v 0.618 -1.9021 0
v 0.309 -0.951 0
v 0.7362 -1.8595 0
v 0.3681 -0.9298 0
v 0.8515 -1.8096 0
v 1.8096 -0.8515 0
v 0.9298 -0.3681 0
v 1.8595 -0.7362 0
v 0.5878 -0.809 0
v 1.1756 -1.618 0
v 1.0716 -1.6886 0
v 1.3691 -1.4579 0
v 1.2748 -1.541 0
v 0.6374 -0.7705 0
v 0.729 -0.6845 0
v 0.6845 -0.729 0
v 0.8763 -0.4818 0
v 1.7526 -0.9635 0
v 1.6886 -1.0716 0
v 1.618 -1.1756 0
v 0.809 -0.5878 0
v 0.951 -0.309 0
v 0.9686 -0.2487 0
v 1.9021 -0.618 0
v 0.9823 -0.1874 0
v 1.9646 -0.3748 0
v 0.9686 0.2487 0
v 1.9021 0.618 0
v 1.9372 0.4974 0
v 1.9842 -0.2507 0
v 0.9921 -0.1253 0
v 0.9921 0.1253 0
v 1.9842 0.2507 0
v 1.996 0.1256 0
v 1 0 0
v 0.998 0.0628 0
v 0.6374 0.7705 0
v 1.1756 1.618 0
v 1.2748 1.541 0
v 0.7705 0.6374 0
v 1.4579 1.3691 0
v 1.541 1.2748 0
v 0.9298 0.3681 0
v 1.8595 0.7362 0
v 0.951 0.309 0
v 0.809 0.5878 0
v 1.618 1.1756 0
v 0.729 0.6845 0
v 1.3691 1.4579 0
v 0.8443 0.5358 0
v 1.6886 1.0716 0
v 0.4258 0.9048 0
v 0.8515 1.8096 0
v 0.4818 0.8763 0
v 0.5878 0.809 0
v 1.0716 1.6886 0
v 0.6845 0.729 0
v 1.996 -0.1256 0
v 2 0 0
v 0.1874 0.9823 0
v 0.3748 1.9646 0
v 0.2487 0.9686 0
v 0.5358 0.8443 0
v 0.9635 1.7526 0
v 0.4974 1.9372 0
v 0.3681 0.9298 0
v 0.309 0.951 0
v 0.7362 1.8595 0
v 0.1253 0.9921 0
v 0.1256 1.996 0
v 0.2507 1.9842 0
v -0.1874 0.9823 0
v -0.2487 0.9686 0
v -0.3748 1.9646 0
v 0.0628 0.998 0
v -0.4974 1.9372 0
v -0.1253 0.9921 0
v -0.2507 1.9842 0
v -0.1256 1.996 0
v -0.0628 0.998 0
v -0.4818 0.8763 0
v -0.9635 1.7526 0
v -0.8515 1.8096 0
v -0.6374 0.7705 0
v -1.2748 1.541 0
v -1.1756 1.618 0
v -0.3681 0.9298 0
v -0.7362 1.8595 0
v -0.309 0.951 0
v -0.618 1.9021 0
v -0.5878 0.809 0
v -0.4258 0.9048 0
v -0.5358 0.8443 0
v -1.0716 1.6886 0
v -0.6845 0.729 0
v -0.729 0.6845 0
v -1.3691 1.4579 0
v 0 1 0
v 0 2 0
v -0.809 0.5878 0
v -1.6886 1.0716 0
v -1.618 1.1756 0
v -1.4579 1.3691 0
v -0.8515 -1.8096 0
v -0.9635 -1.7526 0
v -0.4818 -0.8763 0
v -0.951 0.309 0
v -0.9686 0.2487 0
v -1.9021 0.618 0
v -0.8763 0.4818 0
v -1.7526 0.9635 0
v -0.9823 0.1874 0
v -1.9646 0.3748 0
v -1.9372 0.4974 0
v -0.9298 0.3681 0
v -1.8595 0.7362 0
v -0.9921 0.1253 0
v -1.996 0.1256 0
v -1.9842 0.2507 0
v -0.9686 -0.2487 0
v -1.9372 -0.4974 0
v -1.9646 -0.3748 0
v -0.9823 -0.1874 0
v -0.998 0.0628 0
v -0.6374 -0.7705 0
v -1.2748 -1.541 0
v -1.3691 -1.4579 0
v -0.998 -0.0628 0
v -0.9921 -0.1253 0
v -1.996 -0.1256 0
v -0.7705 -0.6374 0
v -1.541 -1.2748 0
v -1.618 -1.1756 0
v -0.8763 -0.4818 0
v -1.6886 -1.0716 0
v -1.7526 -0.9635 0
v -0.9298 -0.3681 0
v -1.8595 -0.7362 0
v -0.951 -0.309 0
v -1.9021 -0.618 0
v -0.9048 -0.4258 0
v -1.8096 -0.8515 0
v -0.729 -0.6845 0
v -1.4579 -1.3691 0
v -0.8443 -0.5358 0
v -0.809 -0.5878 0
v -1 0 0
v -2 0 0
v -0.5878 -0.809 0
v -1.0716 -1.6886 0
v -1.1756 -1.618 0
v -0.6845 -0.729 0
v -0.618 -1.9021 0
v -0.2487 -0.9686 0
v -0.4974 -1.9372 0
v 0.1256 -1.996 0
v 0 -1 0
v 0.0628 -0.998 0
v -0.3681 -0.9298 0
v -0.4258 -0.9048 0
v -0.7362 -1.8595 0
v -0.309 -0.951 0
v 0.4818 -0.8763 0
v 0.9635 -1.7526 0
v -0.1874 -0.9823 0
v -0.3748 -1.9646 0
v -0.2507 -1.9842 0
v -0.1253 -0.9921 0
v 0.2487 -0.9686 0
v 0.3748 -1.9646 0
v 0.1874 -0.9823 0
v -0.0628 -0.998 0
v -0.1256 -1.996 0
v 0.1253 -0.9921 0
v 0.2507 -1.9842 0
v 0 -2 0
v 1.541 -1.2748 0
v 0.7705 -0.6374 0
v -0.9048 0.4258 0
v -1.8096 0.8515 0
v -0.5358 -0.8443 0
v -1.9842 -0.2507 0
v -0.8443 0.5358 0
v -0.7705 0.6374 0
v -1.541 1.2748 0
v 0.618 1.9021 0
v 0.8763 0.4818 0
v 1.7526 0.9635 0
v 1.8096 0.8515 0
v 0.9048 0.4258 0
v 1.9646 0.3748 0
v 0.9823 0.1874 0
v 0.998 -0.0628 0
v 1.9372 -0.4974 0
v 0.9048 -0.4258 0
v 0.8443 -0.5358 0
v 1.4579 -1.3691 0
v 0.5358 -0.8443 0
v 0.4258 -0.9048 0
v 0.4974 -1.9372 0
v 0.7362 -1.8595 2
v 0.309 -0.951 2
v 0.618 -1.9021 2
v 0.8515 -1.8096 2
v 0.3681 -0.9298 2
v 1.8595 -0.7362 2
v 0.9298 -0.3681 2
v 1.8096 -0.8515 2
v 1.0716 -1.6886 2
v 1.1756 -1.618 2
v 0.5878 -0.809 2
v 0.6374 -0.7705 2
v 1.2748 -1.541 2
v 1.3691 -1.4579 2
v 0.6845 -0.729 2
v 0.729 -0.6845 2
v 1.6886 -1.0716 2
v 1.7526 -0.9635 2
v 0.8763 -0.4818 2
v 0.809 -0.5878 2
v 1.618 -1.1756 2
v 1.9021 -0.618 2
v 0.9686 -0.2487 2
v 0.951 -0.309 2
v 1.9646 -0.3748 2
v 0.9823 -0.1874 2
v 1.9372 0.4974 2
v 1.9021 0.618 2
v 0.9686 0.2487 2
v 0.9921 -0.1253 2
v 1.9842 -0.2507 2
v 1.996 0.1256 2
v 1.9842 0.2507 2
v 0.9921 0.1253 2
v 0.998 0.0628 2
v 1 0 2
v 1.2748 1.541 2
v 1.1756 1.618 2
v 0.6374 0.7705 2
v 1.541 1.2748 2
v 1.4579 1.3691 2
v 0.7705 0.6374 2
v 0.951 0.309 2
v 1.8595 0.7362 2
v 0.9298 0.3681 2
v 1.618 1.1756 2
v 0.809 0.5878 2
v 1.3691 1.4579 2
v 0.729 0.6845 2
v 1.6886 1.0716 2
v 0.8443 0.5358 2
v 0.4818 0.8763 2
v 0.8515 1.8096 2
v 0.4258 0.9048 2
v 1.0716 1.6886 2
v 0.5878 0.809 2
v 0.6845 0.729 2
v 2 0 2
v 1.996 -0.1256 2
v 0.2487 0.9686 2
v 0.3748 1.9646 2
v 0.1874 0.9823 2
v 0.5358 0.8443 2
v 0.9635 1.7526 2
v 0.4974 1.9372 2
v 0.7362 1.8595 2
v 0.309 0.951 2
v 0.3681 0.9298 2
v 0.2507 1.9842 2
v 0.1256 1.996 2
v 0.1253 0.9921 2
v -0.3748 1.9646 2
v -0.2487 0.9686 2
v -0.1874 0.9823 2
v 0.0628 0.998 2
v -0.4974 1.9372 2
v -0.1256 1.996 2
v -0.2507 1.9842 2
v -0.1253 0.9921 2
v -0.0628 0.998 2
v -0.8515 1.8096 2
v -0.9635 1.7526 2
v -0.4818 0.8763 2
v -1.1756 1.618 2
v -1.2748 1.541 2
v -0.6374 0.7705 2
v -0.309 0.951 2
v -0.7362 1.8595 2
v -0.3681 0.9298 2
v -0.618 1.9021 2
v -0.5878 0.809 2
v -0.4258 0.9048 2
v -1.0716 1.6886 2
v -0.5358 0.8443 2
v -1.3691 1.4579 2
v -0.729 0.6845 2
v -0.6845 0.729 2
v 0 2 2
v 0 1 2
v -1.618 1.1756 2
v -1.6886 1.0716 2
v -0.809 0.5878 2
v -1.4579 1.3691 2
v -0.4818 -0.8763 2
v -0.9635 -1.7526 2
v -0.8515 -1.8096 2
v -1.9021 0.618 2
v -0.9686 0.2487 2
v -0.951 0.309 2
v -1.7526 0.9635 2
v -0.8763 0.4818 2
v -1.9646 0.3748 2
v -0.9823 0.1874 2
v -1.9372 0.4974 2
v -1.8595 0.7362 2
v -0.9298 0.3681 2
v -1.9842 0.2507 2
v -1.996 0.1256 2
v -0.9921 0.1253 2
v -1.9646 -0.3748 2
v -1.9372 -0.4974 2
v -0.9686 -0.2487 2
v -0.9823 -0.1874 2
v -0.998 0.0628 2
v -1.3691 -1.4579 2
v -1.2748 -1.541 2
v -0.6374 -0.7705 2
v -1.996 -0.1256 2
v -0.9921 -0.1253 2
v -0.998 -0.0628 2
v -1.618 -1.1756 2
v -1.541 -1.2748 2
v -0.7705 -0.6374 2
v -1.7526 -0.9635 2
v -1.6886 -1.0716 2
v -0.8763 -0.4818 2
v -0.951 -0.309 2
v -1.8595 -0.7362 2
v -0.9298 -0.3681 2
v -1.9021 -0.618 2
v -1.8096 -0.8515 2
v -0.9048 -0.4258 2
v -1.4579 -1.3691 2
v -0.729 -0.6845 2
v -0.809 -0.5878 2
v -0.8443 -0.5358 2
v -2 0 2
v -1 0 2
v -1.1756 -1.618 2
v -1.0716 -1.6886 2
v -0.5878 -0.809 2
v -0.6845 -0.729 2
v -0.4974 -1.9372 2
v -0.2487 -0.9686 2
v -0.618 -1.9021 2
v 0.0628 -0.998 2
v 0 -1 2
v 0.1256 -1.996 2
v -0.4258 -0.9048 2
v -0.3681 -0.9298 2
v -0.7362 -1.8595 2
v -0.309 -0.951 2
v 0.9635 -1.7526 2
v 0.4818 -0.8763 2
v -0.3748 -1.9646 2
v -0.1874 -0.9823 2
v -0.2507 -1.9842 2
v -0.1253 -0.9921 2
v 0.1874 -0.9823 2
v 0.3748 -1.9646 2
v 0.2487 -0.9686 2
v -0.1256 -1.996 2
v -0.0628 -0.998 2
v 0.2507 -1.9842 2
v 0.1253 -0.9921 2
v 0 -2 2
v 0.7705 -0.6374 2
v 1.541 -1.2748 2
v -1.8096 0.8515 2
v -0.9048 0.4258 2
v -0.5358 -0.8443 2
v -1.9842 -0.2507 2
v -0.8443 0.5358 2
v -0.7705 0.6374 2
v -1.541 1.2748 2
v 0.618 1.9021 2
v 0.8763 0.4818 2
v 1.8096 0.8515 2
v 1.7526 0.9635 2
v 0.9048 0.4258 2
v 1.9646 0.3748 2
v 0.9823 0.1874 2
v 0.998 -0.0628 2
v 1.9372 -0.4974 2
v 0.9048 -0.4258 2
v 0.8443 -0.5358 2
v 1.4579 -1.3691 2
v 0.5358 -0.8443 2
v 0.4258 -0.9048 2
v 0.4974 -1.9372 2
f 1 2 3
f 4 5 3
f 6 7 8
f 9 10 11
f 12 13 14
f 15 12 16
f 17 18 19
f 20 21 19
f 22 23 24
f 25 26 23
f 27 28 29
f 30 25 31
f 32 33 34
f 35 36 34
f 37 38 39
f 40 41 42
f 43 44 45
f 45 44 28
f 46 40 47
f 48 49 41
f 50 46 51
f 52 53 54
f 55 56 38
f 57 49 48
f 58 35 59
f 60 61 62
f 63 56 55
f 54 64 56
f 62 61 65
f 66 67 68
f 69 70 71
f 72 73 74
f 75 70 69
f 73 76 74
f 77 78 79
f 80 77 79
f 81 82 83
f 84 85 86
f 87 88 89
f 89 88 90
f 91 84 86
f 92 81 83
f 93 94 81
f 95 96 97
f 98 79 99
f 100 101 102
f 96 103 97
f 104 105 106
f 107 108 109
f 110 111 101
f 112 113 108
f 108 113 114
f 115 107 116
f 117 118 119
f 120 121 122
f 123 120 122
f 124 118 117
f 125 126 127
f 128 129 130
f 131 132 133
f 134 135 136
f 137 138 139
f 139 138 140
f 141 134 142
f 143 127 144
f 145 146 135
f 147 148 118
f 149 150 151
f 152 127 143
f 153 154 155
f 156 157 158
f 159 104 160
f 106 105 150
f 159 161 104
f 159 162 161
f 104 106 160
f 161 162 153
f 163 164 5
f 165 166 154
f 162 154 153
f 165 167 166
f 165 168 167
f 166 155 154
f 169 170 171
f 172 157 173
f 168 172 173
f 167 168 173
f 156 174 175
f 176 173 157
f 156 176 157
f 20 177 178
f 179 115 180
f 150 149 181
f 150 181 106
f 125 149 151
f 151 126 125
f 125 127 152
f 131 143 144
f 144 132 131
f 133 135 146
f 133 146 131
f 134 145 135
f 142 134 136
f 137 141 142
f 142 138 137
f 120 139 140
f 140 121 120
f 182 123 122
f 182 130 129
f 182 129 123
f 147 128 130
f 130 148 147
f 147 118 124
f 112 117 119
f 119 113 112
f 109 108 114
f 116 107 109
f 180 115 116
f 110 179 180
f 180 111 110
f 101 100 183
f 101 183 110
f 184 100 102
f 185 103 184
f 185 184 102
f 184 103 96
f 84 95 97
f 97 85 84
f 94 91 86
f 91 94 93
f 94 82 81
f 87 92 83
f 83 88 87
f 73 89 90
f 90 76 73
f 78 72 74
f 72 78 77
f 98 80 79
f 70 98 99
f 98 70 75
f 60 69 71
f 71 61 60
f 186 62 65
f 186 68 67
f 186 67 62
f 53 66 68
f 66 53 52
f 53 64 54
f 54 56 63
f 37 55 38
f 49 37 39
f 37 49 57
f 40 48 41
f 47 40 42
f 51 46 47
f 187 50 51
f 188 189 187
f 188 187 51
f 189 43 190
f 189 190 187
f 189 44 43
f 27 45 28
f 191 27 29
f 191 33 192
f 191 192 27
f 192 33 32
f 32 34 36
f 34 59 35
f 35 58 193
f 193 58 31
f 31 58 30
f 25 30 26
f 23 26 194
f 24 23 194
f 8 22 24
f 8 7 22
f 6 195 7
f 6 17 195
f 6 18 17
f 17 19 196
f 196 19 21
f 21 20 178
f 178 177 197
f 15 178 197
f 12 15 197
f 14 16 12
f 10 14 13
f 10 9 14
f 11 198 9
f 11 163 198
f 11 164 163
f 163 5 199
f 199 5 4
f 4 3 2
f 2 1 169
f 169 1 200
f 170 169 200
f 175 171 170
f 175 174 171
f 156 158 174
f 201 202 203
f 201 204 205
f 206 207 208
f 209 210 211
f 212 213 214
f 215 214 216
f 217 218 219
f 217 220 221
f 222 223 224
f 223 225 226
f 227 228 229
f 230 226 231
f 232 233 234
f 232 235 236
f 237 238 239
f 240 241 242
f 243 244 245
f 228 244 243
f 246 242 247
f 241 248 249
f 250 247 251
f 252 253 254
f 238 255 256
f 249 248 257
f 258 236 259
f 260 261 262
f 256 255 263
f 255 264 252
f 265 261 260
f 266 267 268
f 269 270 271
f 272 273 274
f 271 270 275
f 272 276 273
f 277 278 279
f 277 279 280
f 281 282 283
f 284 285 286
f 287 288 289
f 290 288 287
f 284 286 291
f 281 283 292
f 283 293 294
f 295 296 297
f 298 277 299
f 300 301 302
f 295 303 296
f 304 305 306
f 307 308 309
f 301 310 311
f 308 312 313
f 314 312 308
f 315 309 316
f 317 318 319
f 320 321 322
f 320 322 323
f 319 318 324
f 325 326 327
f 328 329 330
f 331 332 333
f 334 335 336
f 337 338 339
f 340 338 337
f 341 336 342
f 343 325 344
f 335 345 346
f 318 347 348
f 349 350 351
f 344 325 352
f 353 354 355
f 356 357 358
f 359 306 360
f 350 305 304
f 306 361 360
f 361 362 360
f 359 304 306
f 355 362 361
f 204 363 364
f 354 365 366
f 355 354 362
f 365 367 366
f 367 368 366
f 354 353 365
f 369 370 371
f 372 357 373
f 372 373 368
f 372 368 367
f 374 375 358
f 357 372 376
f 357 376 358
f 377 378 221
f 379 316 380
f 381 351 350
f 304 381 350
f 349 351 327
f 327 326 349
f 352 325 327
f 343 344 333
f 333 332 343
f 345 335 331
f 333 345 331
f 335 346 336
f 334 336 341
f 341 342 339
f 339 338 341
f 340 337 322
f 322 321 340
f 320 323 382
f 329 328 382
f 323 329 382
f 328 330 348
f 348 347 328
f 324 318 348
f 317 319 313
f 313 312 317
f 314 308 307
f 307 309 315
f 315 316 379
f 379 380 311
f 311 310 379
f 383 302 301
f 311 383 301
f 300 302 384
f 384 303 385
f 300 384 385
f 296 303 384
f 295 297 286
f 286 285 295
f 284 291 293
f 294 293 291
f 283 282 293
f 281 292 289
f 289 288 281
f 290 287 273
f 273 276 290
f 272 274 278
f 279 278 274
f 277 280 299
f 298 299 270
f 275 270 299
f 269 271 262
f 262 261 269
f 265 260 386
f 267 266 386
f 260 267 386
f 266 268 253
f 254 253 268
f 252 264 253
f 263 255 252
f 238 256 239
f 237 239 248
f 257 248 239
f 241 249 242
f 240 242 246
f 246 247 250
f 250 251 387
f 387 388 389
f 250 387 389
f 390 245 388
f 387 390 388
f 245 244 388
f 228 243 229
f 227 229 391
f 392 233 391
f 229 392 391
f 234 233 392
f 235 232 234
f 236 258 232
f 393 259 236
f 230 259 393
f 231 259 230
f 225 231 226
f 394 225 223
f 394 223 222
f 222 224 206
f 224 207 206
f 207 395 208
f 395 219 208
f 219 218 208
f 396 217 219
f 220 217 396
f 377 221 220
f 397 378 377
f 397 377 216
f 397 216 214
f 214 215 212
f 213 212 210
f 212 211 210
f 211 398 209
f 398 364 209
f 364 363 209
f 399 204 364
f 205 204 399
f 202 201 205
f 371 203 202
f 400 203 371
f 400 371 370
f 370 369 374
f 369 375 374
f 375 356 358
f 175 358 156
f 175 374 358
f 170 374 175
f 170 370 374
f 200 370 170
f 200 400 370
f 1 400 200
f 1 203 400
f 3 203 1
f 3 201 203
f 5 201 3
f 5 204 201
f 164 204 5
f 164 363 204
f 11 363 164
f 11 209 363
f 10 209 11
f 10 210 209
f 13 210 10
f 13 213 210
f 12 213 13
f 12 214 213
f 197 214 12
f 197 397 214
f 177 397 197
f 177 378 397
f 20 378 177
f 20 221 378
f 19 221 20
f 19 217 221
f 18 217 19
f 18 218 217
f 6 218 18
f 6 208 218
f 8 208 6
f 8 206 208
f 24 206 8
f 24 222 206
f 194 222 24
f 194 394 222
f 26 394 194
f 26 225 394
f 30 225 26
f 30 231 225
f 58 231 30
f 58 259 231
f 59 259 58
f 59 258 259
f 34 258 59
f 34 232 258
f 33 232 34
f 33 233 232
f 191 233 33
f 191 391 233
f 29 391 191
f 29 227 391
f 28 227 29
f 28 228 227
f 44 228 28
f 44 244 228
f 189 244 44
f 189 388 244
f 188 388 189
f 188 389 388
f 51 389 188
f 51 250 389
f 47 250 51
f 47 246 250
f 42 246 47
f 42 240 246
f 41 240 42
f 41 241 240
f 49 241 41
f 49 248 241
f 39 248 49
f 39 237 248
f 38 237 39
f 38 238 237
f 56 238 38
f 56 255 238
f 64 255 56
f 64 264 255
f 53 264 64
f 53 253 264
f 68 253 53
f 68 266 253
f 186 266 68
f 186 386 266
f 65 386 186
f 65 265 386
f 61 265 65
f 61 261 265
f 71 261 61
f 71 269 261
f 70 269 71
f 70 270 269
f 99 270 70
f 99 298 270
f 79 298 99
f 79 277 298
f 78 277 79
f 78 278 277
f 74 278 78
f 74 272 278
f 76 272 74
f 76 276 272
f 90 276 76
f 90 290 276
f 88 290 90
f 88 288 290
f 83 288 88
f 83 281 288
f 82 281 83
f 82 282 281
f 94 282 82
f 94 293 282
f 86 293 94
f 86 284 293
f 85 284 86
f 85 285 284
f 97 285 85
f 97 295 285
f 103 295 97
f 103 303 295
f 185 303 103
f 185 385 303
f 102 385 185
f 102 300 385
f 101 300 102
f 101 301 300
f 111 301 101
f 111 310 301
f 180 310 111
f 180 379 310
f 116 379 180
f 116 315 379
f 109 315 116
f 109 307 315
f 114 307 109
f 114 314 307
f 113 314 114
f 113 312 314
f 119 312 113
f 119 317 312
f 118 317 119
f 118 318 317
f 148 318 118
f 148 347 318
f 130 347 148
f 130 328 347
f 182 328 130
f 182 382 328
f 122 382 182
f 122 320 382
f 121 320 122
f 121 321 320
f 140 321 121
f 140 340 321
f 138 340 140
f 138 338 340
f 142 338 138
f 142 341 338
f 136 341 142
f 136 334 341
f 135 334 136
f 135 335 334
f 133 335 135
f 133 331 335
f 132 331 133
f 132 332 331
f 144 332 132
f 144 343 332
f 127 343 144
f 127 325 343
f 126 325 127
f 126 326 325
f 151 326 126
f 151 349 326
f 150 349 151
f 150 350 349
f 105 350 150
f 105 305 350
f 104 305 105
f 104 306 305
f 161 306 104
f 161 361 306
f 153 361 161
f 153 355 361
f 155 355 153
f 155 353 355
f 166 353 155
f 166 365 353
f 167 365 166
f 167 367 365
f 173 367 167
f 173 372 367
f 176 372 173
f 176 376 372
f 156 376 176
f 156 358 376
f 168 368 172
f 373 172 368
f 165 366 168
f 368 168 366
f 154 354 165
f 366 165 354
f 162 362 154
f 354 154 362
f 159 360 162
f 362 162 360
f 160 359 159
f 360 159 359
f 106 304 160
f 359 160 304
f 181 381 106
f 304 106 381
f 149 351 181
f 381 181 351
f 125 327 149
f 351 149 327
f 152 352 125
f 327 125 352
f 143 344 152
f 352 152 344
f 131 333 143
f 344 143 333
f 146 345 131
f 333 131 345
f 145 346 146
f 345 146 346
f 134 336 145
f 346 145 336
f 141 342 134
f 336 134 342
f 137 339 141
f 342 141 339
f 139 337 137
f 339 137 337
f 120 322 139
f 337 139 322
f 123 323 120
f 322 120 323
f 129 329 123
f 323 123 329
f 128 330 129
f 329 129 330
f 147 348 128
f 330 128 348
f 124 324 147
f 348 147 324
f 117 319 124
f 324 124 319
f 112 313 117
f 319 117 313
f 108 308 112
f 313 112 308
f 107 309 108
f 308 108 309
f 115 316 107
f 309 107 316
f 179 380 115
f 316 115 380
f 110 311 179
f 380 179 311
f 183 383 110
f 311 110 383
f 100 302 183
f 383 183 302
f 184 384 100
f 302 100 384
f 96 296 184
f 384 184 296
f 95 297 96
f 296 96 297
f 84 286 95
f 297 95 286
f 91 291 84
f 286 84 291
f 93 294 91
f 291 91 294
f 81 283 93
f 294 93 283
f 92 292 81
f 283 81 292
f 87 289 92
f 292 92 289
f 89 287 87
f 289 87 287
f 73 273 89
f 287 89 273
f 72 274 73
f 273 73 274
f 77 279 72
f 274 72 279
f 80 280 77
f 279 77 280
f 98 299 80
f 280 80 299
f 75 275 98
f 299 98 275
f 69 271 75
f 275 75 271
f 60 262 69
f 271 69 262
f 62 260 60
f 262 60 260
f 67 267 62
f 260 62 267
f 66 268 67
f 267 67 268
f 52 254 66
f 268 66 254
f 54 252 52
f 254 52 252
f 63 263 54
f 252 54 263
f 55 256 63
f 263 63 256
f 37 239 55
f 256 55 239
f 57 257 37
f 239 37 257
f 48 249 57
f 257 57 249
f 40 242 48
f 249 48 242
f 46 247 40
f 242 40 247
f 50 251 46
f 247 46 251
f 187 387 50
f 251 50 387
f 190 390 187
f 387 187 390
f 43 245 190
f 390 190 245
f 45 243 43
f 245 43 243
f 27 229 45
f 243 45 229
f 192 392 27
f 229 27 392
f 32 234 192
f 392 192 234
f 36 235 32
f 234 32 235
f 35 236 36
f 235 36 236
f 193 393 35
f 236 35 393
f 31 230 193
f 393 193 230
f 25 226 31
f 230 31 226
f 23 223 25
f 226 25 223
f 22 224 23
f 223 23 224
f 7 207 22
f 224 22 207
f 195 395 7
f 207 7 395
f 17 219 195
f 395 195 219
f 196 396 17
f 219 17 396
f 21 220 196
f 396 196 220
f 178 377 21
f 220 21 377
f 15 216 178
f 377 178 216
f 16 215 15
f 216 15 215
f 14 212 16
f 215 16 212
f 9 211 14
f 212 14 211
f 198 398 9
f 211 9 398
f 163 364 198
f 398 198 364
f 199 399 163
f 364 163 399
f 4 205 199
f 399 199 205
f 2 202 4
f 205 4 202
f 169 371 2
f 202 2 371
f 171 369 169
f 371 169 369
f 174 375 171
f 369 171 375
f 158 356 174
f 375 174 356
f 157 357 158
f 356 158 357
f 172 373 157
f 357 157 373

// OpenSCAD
$fn = 100;

module spacer(diameter, bore_diameter, thickness) {
    linear_extrude(thickness) {
        difference() {
            circle(d=diameter);
            circle(d=bore_diameter);
        }
    }
}

spacer(4, 2, 2);
